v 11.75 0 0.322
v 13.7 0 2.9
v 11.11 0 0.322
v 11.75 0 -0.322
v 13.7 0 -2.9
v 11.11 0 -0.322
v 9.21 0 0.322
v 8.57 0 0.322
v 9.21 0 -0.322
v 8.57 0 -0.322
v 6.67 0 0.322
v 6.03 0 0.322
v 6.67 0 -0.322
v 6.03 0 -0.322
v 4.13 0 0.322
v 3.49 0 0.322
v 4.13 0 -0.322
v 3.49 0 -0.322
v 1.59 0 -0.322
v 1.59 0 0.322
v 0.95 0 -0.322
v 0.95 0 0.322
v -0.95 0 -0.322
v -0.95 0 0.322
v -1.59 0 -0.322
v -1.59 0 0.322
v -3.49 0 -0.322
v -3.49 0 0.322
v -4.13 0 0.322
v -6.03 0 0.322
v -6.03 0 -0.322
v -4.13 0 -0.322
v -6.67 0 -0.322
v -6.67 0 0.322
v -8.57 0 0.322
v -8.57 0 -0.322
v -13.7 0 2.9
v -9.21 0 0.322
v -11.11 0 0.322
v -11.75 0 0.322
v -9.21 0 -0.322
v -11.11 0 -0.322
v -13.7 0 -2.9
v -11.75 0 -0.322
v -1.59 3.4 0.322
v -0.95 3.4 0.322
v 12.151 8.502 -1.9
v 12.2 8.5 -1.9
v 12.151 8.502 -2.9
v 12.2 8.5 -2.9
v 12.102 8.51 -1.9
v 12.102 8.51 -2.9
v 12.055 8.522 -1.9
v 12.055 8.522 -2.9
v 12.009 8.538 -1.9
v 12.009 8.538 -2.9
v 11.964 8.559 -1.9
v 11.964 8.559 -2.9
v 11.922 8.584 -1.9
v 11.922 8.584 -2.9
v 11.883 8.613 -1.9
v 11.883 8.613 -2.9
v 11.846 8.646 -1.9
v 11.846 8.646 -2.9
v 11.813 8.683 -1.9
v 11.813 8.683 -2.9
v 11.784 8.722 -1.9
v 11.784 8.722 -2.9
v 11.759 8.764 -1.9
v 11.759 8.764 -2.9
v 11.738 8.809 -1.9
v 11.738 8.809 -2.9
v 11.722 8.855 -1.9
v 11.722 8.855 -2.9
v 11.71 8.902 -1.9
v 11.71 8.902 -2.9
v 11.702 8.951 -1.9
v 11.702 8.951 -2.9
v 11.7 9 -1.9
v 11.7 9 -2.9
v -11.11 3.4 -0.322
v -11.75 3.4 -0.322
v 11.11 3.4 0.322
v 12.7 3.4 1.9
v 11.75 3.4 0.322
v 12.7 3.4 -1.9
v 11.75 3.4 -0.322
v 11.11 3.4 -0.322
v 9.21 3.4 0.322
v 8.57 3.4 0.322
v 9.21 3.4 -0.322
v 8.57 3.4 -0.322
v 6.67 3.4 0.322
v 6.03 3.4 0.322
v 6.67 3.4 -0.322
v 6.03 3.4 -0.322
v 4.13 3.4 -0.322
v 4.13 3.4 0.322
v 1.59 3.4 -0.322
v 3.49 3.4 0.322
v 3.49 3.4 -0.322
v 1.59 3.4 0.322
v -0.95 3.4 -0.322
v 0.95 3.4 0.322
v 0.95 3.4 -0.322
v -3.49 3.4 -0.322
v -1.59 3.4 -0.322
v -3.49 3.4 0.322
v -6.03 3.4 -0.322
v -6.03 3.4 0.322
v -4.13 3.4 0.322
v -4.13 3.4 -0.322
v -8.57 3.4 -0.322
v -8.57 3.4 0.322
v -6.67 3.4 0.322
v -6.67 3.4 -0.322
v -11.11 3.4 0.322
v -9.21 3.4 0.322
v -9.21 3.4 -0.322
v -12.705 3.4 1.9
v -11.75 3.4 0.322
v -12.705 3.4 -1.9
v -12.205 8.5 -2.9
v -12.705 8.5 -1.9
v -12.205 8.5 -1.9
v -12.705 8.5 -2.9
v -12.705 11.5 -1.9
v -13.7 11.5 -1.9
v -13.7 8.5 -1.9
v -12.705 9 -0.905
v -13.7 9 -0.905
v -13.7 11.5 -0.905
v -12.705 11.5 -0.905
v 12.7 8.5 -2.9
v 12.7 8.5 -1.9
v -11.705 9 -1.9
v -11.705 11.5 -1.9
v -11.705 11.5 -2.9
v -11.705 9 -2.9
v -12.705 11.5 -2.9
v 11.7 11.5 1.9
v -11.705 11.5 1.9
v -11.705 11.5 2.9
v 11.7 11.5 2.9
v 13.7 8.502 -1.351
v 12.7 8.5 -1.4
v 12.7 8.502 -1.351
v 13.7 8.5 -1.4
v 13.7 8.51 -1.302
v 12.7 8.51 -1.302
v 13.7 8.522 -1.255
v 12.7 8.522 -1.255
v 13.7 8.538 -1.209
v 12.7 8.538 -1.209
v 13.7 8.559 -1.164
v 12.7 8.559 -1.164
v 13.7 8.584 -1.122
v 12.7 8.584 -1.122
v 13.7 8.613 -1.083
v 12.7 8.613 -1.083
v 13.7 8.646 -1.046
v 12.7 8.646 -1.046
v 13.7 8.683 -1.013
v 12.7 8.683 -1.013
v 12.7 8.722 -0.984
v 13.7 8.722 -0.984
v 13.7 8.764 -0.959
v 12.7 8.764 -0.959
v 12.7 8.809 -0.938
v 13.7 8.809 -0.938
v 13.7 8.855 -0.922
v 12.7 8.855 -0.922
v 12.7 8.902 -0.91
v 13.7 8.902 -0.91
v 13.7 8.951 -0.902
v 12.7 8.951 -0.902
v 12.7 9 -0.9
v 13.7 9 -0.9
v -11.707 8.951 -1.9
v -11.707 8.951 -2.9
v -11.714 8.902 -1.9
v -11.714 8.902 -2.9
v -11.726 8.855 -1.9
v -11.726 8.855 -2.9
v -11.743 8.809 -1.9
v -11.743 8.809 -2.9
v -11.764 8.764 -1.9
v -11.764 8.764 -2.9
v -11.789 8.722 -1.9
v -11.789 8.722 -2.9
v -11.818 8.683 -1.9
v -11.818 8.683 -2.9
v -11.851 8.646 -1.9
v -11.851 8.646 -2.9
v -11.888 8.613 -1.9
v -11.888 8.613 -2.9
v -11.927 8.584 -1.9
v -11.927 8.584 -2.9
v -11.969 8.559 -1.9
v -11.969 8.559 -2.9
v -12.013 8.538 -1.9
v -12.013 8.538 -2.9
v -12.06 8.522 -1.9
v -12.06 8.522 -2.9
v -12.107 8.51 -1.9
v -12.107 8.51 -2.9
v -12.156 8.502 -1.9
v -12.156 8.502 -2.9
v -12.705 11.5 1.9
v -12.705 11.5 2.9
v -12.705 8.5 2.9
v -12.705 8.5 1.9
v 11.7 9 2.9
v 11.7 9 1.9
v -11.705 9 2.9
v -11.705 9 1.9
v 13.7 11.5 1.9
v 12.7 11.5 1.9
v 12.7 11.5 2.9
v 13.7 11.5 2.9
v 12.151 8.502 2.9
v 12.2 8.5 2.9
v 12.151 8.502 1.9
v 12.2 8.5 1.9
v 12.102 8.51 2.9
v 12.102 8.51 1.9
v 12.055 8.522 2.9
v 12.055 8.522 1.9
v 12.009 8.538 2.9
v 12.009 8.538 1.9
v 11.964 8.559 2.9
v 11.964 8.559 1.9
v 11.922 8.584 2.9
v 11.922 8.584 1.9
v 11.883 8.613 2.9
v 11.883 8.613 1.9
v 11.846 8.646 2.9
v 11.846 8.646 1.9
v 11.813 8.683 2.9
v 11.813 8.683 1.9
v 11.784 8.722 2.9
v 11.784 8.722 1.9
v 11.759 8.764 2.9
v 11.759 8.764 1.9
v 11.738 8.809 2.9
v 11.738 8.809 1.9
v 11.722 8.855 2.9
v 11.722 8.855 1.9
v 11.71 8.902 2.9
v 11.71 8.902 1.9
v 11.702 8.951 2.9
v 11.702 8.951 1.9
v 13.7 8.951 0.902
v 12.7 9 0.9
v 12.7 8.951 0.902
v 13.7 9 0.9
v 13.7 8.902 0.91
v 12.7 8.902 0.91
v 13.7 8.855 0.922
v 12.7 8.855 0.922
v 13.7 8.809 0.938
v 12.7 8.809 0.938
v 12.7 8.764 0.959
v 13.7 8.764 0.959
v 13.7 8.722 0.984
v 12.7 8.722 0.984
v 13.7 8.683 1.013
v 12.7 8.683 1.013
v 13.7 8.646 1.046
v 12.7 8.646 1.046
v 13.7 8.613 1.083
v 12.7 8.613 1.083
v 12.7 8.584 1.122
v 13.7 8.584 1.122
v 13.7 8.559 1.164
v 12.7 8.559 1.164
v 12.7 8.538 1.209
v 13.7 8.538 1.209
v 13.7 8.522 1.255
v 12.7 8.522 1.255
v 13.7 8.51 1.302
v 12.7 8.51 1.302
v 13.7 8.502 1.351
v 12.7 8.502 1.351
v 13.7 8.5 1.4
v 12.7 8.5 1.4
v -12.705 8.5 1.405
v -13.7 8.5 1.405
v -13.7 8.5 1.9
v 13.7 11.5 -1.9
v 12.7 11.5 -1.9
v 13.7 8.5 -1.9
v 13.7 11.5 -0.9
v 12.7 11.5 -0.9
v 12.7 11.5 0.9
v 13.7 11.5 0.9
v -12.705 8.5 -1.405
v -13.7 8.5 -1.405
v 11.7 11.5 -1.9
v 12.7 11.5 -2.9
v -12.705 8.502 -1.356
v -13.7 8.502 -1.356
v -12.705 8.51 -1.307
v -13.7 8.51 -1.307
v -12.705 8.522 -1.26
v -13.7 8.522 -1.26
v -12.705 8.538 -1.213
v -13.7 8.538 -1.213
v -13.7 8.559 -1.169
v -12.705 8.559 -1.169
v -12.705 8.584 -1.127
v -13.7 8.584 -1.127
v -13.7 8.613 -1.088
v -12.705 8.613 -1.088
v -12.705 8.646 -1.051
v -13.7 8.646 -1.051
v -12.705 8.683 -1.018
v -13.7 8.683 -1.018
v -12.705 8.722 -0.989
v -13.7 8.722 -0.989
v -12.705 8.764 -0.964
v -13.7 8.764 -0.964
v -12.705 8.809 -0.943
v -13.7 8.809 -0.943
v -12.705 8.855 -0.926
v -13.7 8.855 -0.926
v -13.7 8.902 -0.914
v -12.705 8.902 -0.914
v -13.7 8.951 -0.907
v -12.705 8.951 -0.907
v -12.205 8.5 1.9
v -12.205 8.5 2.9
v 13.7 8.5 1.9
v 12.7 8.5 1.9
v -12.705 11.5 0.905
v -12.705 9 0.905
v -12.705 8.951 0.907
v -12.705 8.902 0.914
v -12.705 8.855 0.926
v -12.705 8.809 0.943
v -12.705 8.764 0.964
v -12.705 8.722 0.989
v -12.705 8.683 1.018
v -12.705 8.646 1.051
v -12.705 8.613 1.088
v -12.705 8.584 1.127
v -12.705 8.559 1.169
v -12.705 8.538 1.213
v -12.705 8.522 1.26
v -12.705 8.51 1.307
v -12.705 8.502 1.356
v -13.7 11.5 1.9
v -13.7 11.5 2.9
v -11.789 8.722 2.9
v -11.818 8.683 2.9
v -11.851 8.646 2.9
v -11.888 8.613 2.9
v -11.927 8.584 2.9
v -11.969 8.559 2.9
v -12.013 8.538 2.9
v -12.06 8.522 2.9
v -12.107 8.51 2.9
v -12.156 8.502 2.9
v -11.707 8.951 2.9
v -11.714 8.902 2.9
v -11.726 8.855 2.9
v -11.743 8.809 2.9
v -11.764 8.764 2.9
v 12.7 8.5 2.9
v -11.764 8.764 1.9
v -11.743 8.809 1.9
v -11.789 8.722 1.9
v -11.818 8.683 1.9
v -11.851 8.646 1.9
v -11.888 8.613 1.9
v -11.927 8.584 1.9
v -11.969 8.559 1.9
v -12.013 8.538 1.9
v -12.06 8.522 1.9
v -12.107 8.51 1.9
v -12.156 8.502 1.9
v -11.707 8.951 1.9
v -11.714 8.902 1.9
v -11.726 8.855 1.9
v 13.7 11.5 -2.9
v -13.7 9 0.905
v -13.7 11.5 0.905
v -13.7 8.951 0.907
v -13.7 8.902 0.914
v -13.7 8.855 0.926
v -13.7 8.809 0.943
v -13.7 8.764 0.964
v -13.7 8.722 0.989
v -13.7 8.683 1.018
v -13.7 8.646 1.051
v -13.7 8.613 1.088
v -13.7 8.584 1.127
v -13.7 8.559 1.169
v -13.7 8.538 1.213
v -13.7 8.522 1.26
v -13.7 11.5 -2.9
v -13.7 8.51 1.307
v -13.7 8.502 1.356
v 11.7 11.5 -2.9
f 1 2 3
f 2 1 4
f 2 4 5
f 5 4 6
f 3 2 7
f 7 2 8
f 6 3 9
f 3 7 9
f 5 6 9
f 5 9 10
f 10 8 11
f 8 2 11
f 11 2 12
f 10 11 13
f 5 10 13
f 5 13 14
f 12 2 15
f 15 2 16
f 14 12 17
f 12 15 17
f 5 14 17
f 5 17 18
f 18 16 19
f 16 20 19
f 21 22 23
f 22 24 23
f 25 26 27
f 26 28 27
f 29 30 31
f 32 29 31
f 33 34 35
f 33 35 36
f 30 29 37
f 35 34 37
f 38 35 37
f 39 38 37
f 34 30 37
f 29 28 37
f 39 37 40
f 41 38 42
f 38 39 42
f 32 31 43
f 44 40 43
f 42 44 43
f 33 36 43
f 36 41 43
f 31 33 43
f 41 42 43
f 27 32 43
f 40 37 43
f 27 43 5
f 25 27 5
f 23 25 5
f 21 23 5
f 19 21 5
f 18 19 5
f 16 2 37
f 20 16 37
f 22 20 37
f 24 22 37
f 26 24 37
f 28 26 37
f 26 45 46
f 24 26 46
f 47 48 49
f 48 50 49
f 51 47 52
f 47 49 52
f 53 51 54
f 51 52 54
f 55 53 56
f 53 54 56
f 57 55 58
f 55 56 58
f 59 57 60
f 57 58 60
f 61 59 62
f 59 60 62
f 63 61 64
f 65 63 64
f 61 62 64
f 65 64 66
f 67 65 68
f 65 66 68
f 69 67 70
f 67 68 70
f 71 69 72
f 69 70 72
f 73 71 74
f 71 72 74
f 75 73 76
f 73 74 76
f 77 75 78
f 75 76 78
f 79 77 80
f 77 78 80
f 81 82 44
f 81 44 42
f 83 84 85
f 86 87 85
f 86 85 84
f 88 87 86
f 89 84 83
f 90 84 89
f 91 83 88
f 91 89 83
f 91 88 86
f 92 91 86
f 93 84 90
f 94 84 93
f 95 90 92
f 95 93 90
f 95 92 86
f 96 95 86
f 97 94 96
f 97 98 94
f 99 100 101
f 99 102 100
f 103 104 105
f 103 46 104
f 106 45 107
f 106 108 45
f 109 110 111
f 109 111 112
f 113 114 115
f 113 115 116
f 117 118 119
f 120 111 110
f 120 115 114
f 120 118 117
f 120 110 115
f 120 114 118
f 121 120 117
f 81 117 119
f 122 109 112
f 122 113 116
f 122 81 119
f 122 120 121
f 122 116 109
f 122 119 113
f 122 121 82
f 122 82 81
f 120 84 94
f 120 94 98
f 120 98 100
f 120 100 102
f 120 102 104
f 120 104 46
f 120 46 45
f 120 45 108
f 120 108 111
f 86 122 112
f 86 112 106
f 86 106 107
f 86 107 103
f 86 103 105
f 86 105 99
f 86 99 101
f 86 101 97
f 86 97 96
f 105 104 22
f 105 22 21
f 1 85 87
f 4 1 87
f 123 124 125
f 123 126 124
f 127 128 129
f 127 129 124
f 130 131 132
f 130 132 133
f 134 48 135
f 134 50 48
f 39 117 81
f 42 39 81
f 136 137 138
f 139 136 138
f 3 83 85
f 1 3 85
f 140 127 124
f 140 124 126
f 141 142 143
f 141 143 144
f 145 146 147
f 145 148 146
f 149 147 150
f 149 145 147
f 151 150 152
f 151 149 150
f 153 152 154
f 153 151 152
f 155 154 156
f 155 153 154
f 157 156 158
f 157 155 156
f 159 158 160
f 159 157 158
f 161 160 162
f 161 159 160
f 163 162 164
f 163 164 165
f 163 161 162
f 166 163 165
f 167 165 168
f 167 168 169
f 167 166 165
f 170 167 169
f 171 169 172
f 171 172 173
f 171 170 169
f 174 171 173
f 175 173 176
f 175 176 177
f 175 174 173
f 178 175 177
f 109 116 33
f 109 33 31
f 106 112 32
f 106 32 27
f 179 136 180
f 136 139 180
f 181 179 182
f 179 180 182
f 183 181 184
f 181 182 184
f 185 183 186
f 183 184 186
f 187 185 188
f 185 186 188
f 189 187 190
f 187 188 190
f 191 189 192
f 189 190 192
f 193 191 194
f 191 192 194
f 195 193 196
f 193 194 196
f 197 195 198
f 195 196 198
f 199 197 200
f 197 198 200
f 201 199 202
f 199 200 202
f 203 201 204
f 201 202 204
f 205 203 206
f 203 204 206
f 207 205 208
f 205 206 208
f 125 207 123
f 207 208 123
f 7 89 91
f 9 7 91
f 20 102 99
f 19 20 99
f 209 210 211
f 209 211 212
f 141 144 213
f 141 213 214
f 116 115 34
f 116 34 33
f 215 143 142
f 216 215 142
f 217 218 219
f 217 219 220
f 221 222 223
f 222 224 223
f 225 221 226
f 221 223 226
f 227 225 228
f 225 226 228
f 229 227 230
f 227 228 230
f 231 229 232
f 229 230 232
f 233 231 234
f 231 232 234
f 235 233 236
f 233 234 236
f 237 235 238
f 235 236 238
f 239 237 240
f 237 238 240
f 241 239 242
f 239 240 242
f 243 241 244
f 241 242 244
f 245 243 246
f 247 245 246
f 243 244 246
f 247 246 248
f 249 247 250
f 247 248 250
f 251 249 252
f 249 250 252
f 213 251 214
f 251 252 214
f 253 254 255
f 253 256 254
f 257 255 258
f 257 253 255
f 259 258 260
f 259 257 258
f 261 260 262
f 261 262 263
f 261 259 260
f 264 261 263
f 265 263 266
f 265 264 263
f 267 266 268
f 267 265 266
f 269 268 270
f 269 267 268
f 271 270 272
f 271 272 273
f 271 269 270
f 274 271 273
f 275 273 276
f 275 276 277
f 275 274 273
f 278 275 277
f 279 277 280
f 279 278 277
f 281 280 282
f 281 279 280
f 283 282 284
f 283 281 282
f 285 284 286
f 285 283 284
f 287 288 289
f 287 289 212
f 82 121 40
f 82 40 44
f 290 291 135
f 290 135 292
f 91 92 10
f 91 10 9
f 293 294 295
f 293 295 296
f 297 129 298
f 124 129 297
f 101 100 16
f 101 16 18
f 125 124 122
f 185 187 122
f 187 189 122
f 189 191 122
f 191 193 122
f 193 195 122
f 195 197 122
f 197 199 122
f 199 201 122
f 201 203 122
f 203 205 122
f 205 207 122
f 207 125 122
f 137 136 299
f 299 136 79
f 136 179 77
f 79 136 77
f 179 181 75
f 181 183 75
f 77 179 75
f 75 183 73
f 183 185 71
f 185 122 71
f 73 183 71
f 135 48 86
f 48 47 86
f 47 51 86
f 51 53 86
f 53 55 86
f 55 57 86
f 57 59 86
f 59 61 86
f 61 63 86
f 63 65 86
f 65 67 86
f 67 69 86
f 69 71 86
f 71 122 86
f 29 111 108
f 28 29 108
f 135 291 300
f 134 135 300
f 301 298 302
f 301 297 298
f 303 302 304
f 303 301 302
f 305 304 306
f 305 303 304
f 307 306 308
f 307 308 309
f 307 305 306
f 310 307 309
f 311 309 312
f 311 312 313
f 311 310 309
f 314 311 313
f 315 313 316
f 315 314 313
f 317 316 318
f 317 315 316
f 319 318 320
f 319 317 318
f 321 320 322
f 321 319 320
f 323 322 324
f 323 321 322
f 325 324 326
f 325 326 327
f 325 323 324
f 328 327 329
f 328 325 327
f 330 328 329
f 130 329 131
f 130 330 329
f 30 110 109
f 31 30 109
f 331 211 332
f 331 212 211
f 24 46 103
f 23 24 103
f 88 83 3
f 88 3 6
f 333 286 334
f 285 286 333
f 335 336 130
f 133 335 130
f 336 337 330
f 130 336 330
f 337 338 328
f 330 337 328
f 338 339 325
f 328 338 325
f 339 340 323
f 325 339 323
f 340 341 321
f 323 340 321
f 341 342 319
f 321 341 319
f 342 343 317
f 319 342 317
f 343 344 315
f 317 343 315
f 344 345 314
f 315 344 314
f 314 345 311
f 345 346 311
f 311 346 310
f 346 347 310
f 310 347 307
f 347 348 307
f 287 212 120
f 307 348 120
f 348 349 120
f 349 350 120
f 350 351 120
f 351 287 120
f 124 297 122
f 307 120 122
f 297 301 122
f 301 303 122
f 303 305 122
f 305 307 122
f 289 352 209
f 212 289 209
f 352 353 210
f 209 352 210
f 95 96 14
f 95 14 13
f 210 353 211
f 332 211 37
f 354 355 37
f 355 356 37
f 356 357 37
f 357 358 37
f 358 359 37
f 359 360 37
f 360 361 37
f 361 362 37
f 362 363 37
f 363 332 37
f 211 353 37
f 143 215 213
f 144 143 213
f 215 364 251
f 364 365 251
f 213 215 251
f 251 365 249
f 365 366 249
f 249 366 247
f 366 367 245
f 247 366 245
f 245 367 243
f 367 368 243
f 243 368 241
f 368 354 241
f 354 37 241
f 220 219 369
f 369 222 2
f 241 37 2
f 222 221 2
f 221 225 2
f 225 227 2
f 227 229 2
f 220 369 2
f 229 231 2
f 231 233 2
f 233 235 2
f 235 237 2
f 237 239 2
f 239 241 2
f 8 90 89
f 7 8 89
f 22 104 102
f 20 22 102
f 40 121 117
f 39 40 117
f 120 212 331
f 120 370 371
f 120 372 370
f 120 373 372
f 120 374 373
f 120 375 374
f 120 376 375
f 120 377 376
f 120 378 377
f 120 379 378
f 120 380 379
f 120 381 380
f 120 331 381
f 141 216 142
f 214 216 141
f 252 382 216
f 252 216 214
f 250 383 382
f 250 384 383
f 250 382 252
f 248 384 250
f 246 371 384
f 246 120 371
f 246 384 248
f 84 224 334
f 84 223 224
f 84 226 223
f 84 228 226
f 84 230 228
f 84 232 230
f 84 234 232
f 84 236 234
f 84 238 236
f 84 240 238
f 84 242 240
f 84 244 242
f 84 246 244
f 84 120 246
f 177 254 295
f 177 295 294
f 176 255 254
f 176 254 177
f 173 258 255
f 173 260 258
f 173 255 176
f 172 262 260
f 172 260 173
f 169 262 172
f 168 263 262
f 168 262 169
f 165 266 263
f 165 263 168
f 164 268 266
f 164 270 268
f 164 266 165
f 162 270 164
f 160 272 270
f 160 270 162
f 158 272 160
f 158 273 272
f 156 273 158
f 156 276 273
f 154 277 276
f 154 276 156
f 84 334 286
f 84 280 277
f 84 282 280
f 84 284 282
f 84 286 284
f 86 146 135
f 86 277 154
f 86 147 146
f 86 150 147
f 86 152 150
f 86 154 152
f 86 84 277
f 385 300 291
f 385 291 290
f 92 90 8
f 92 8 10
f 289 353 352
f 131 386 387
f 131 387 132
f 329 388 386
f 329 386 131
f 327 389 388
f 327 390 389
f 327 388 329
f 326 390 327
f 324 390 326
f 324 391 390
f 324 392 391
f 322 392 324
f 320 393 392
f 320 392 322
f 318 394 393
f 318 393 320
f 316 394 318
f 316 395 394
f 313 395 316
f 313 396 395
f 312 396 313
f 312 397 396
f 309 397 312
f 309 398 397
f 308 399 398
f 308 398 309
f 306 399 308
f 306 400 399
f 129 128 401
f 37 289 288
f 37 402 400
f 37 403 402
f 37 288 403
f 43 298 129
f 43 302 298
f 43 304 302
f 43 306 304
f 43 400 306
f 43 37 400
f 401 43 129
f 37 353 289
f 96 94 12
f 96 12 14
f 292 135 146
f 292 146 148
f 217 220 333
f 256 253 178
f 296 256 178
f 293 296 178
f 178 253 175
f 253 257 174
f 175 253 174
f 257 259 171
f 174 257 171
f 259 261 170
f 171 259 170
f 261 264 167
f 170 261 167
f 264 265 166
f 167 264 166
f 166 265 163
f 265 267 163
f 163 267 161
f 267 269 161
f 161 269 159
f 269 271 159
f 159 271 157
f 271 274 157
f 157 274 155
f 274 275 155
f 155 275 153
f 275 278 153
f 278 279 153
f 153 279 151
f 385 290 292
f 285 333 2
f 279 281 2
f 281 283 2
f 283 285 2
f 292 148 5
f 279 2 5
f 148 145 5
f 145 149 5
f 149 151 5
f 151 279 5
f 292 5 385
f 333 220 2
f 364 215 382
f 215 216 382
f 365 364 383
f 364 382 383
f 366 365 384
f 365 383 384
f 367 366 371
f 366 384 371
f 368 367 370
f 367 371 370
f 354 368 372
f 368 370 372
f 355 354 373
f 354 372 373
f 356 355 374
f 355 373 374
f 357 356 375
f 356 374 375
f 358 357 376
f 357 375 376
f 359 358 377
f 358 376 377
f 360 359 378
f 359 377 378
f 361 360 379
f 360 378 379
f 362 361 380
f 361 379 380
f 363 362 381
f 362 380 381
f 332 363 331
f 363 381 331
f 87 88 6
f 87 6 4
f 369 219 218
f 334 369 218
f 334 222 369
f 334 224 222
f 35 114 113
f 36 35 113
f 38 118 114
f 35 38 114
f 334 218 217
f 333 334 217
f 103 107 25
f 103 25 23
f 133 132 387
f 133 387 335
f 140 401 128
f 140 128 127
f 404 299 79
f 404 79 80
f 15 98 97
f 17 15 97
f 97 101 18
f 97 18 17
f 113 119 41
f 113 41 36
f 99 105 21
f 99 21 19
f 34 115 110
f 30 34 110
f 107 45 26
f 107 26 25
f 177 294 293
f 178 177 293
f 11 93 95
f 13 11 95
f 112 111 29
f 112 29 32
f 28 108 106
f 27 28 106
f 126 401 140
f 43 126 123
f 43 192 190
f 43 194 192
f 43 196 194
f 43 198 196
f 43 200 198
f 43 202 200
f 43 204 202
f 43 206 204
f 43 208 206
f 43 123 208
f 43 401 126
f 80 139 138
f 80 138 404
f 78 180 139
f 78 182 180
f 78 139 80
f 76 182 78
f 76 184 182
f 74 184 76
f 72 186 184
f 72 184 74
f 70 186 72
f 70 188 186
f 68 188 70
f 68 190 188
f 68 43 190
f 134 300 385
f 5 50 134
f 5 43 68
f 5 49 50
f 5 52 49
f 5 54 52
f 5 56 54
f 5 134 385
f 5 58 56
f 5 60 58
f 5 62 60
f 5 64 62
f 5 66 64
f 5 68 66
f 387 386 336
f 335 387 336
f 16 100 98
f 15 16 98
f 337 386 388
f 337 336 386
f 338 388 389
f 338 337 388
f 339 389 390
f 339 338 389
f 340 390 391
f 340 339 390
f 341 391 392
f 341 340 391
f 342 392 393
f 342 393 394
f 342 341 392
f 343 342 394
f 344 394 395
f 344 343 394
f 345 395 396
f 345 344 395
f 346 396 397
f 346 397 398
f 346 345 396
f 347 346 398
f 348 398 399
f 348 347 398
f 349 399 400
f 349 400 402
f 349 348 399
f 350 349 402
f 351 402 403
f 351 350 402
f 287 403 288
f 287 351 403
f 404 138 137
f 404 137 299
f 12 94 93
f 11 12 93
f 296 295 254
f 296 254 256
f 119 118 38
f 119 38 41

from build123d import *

# Parameters (mm, degrees)
SZKIC1_W                    = 25.4
SZKIC1_H                    = 5.8
DODANIE_WYCI_GNI_CIE2_DEPTH = 3.4
SZKIC3_W                    = 0.64
SZKIC3_H                    = 0.643583424
WYTNIJ_WYCI_GNI_CIE1_DEPTH  = 3.4
SZKIC5_W                    = 5.8
SZKIC5_H                    = 3.4
DODANIE_WYCI_GNI_CIE3_DEPTH = 1
SZKIC6_W                    = 5.8
SZKIC6_H                    = 3.4
DODANIE_WYCI_GNI_CIE4_DEPTH = 1
SZKIC7_W                    = 27.4
SZKIC7_H                    = 5.8
SZKIC7_W_2                  = 25.404799249
SZKIC7_H_2                  = 3.8
DODANIE_WYCI_GNI_CIE6_DEPTH = 8.1
SZKIC8_W                    = 1
SZKIC8_H                    = 1
SZKIC8_W_2                  = 0.995200751
SZKIC8_H_2                  = 0.995200751
WYTNIJ_WYCI_GNI_CIE3_DEPTH  = 3
ZAOKR_GLENIE1_R             = 0.5


with BuildPart() as part:
    # Szkic1 → Dodanie-wyciągnięcie2 (new body)
    with BuildSketch(Plane(origin=(0, 0, 0), x_dir=(1, 0, 0), z_dir=(0, 1, 0))):
        Rectangle(SZKIC1_W, SZKIC1_H)
    extrude(amount=DODANIE_WYCI_GNI_CIE2_DEPTH)

    # Szkic3 → Wytnij-wyciągnięcie1 (cut)
    with BuildSketch(Plane(origin=(0, 3.4, 0), x_dir=(1, 0, 0), z_dir=(0, 1, 0))):
        with Locations((-11.43, 0)):
            Rectangle(SZKIC3_W, SZKIC3_H)
        with Locations((-8.89, 0)):
            Rectangle(SZKIC3_W, SZKIC3_H)
        with Locations((-6.35, 0)):
            Rectangle(SZKIC3_W, SZKIC3_H)
        with Locations((-3.81, 0)):
            Rectangle(SZKIC3_W, SZKIC3_H)
        with Locations((-1.27, 0)):
            Rectangle(SZKIC3_W, SZKIC3_H)
        with Locations((1.27, 0)):
            Rectangle(SZKIC3_W, SZKIC3_H)
        with Locations((3.81, 0)):
            Rectangle(SZKIC3_W, SZKIC3_H)
        with Locations((6.35, 0)):
            Rectangle(SZKIC3_W, SZKIC3_H)
        with Locations((8.89, 0)):
            Rectangle(SZKIC3_W, SZKIC3_H)
        with Locations((11.43, 0)):
            Rectangle(SZKIC3_W, SZKIC3_H)
    extrude(amount=-WYTNIJ_WYCI_GNI_CIE1_DEPTH, mode=Mode.SUBTRACT)

    # Szkic5 → Dodanie-wyciągnięcie3 (add)
    with BuildSketch(Plane.ZY.offset(12.7)):
        with Locations((0, 1.7)):
            Rectangle(SZKIC5_W, SZKIC5_H)
    extrude(amount=DODANIE_WYCI_GNI_CIE3_DEPTH)

    # Szkic6 → Dodanie-wyciągnięcie4 (add)
    with BuildSketch(Plane(origin=(12.7, 0, 0), x_dir=(0, 0, -1), z_dir=(1, 0, 0))):
        with Locations((0, 1.7)):
            Rectangle(SZKIC6_W, SZKIC6_H)
    extrude(amount=DODANIE_WYCI_GNI_CIE4_DEPTH)

    # Szkic7 → Dodanie-wyciągnięcie6 (add)
    with BuildSketch(Plane(origin=(0, 3.4, 0), x_dir=(1, 0, 0), z_dir=(0, 1, 0))):
        Rectangle(SZKIC7_W, SZKIC7_H)
        with Locations((-0.002399624, 0)):
            Rectangle(SZKIC7_W_2, SZKIC7_H_2, mode=Mode.SUBTRACT)
    extrude(amount=DODANIE_WYCI_GNI_CIE6_DEPTH)

    # Szkic8 → Wytnij-wyciągnięcie3 (cut)
    with BuildSketch(Plane(origin=(0, 11.5, 0), x_dir=(1, 0, 0), z_dir=(0, 1, 0))):
        with Locations((12.2, 2.4)):
            Rectangle(SZKIC8_W, SZKIC8_H)
        with Locations((13.2, 1.4)):
            Rectangle(SZKIC8_W, SZKIC8_H)
        with Locations((13.2, -1.4)):
            Rectangle(SZKIC8_W, SZKIC8_H)
        with Locations((12.2, -2.4)):
            Rectangle(SZKIC8_W, SZKIC8_H)
        with Locations((-12.204799249, -2.4)):
            Rectangle(SZKIC8_W, SZKIC8_H)
        with Locations((-13.202399624, -1.402399625)):
            Rectangle(SZKIC8_W_2, SZKIC8_H_2)
        with Locations((-13.202399624, 1.402399625)):
            Rectangle(SZKIC8_W_2, SZKIC8_H_2)
        with Locations((-12.204799249, 2.4)):
            Rectangle(SZKIC8_W, SZKIC8_H)
    extrude(amount=-WYTNIJ_WYCI_GNI_CIE3_DEPTH, mode=Mode.SUBTRACT)

    # Zaokrąglenie1
    zaokr_glenie1_edges = [part.edges().sort_by_distance(p)[0] for p in [
        (-13.202399624, 8.5, -0.904799249),
        (-13.202399624, 8.5, 0.904799249),
        (13.2, 8.5, 0.9),
        (13.2, 8.5, -0.9),
        (11.7, 8.5, -2.4),
        (11.7, 8.5, 2.4),
        (-11.704799249, 8.5, 2.4),
        (-11.704799249, 8.5, -2.4),
    ]]
    fillet(zaokr_glenie1_edges, radius=ZAOKR_GLENIE1_R)


solid = part.part
